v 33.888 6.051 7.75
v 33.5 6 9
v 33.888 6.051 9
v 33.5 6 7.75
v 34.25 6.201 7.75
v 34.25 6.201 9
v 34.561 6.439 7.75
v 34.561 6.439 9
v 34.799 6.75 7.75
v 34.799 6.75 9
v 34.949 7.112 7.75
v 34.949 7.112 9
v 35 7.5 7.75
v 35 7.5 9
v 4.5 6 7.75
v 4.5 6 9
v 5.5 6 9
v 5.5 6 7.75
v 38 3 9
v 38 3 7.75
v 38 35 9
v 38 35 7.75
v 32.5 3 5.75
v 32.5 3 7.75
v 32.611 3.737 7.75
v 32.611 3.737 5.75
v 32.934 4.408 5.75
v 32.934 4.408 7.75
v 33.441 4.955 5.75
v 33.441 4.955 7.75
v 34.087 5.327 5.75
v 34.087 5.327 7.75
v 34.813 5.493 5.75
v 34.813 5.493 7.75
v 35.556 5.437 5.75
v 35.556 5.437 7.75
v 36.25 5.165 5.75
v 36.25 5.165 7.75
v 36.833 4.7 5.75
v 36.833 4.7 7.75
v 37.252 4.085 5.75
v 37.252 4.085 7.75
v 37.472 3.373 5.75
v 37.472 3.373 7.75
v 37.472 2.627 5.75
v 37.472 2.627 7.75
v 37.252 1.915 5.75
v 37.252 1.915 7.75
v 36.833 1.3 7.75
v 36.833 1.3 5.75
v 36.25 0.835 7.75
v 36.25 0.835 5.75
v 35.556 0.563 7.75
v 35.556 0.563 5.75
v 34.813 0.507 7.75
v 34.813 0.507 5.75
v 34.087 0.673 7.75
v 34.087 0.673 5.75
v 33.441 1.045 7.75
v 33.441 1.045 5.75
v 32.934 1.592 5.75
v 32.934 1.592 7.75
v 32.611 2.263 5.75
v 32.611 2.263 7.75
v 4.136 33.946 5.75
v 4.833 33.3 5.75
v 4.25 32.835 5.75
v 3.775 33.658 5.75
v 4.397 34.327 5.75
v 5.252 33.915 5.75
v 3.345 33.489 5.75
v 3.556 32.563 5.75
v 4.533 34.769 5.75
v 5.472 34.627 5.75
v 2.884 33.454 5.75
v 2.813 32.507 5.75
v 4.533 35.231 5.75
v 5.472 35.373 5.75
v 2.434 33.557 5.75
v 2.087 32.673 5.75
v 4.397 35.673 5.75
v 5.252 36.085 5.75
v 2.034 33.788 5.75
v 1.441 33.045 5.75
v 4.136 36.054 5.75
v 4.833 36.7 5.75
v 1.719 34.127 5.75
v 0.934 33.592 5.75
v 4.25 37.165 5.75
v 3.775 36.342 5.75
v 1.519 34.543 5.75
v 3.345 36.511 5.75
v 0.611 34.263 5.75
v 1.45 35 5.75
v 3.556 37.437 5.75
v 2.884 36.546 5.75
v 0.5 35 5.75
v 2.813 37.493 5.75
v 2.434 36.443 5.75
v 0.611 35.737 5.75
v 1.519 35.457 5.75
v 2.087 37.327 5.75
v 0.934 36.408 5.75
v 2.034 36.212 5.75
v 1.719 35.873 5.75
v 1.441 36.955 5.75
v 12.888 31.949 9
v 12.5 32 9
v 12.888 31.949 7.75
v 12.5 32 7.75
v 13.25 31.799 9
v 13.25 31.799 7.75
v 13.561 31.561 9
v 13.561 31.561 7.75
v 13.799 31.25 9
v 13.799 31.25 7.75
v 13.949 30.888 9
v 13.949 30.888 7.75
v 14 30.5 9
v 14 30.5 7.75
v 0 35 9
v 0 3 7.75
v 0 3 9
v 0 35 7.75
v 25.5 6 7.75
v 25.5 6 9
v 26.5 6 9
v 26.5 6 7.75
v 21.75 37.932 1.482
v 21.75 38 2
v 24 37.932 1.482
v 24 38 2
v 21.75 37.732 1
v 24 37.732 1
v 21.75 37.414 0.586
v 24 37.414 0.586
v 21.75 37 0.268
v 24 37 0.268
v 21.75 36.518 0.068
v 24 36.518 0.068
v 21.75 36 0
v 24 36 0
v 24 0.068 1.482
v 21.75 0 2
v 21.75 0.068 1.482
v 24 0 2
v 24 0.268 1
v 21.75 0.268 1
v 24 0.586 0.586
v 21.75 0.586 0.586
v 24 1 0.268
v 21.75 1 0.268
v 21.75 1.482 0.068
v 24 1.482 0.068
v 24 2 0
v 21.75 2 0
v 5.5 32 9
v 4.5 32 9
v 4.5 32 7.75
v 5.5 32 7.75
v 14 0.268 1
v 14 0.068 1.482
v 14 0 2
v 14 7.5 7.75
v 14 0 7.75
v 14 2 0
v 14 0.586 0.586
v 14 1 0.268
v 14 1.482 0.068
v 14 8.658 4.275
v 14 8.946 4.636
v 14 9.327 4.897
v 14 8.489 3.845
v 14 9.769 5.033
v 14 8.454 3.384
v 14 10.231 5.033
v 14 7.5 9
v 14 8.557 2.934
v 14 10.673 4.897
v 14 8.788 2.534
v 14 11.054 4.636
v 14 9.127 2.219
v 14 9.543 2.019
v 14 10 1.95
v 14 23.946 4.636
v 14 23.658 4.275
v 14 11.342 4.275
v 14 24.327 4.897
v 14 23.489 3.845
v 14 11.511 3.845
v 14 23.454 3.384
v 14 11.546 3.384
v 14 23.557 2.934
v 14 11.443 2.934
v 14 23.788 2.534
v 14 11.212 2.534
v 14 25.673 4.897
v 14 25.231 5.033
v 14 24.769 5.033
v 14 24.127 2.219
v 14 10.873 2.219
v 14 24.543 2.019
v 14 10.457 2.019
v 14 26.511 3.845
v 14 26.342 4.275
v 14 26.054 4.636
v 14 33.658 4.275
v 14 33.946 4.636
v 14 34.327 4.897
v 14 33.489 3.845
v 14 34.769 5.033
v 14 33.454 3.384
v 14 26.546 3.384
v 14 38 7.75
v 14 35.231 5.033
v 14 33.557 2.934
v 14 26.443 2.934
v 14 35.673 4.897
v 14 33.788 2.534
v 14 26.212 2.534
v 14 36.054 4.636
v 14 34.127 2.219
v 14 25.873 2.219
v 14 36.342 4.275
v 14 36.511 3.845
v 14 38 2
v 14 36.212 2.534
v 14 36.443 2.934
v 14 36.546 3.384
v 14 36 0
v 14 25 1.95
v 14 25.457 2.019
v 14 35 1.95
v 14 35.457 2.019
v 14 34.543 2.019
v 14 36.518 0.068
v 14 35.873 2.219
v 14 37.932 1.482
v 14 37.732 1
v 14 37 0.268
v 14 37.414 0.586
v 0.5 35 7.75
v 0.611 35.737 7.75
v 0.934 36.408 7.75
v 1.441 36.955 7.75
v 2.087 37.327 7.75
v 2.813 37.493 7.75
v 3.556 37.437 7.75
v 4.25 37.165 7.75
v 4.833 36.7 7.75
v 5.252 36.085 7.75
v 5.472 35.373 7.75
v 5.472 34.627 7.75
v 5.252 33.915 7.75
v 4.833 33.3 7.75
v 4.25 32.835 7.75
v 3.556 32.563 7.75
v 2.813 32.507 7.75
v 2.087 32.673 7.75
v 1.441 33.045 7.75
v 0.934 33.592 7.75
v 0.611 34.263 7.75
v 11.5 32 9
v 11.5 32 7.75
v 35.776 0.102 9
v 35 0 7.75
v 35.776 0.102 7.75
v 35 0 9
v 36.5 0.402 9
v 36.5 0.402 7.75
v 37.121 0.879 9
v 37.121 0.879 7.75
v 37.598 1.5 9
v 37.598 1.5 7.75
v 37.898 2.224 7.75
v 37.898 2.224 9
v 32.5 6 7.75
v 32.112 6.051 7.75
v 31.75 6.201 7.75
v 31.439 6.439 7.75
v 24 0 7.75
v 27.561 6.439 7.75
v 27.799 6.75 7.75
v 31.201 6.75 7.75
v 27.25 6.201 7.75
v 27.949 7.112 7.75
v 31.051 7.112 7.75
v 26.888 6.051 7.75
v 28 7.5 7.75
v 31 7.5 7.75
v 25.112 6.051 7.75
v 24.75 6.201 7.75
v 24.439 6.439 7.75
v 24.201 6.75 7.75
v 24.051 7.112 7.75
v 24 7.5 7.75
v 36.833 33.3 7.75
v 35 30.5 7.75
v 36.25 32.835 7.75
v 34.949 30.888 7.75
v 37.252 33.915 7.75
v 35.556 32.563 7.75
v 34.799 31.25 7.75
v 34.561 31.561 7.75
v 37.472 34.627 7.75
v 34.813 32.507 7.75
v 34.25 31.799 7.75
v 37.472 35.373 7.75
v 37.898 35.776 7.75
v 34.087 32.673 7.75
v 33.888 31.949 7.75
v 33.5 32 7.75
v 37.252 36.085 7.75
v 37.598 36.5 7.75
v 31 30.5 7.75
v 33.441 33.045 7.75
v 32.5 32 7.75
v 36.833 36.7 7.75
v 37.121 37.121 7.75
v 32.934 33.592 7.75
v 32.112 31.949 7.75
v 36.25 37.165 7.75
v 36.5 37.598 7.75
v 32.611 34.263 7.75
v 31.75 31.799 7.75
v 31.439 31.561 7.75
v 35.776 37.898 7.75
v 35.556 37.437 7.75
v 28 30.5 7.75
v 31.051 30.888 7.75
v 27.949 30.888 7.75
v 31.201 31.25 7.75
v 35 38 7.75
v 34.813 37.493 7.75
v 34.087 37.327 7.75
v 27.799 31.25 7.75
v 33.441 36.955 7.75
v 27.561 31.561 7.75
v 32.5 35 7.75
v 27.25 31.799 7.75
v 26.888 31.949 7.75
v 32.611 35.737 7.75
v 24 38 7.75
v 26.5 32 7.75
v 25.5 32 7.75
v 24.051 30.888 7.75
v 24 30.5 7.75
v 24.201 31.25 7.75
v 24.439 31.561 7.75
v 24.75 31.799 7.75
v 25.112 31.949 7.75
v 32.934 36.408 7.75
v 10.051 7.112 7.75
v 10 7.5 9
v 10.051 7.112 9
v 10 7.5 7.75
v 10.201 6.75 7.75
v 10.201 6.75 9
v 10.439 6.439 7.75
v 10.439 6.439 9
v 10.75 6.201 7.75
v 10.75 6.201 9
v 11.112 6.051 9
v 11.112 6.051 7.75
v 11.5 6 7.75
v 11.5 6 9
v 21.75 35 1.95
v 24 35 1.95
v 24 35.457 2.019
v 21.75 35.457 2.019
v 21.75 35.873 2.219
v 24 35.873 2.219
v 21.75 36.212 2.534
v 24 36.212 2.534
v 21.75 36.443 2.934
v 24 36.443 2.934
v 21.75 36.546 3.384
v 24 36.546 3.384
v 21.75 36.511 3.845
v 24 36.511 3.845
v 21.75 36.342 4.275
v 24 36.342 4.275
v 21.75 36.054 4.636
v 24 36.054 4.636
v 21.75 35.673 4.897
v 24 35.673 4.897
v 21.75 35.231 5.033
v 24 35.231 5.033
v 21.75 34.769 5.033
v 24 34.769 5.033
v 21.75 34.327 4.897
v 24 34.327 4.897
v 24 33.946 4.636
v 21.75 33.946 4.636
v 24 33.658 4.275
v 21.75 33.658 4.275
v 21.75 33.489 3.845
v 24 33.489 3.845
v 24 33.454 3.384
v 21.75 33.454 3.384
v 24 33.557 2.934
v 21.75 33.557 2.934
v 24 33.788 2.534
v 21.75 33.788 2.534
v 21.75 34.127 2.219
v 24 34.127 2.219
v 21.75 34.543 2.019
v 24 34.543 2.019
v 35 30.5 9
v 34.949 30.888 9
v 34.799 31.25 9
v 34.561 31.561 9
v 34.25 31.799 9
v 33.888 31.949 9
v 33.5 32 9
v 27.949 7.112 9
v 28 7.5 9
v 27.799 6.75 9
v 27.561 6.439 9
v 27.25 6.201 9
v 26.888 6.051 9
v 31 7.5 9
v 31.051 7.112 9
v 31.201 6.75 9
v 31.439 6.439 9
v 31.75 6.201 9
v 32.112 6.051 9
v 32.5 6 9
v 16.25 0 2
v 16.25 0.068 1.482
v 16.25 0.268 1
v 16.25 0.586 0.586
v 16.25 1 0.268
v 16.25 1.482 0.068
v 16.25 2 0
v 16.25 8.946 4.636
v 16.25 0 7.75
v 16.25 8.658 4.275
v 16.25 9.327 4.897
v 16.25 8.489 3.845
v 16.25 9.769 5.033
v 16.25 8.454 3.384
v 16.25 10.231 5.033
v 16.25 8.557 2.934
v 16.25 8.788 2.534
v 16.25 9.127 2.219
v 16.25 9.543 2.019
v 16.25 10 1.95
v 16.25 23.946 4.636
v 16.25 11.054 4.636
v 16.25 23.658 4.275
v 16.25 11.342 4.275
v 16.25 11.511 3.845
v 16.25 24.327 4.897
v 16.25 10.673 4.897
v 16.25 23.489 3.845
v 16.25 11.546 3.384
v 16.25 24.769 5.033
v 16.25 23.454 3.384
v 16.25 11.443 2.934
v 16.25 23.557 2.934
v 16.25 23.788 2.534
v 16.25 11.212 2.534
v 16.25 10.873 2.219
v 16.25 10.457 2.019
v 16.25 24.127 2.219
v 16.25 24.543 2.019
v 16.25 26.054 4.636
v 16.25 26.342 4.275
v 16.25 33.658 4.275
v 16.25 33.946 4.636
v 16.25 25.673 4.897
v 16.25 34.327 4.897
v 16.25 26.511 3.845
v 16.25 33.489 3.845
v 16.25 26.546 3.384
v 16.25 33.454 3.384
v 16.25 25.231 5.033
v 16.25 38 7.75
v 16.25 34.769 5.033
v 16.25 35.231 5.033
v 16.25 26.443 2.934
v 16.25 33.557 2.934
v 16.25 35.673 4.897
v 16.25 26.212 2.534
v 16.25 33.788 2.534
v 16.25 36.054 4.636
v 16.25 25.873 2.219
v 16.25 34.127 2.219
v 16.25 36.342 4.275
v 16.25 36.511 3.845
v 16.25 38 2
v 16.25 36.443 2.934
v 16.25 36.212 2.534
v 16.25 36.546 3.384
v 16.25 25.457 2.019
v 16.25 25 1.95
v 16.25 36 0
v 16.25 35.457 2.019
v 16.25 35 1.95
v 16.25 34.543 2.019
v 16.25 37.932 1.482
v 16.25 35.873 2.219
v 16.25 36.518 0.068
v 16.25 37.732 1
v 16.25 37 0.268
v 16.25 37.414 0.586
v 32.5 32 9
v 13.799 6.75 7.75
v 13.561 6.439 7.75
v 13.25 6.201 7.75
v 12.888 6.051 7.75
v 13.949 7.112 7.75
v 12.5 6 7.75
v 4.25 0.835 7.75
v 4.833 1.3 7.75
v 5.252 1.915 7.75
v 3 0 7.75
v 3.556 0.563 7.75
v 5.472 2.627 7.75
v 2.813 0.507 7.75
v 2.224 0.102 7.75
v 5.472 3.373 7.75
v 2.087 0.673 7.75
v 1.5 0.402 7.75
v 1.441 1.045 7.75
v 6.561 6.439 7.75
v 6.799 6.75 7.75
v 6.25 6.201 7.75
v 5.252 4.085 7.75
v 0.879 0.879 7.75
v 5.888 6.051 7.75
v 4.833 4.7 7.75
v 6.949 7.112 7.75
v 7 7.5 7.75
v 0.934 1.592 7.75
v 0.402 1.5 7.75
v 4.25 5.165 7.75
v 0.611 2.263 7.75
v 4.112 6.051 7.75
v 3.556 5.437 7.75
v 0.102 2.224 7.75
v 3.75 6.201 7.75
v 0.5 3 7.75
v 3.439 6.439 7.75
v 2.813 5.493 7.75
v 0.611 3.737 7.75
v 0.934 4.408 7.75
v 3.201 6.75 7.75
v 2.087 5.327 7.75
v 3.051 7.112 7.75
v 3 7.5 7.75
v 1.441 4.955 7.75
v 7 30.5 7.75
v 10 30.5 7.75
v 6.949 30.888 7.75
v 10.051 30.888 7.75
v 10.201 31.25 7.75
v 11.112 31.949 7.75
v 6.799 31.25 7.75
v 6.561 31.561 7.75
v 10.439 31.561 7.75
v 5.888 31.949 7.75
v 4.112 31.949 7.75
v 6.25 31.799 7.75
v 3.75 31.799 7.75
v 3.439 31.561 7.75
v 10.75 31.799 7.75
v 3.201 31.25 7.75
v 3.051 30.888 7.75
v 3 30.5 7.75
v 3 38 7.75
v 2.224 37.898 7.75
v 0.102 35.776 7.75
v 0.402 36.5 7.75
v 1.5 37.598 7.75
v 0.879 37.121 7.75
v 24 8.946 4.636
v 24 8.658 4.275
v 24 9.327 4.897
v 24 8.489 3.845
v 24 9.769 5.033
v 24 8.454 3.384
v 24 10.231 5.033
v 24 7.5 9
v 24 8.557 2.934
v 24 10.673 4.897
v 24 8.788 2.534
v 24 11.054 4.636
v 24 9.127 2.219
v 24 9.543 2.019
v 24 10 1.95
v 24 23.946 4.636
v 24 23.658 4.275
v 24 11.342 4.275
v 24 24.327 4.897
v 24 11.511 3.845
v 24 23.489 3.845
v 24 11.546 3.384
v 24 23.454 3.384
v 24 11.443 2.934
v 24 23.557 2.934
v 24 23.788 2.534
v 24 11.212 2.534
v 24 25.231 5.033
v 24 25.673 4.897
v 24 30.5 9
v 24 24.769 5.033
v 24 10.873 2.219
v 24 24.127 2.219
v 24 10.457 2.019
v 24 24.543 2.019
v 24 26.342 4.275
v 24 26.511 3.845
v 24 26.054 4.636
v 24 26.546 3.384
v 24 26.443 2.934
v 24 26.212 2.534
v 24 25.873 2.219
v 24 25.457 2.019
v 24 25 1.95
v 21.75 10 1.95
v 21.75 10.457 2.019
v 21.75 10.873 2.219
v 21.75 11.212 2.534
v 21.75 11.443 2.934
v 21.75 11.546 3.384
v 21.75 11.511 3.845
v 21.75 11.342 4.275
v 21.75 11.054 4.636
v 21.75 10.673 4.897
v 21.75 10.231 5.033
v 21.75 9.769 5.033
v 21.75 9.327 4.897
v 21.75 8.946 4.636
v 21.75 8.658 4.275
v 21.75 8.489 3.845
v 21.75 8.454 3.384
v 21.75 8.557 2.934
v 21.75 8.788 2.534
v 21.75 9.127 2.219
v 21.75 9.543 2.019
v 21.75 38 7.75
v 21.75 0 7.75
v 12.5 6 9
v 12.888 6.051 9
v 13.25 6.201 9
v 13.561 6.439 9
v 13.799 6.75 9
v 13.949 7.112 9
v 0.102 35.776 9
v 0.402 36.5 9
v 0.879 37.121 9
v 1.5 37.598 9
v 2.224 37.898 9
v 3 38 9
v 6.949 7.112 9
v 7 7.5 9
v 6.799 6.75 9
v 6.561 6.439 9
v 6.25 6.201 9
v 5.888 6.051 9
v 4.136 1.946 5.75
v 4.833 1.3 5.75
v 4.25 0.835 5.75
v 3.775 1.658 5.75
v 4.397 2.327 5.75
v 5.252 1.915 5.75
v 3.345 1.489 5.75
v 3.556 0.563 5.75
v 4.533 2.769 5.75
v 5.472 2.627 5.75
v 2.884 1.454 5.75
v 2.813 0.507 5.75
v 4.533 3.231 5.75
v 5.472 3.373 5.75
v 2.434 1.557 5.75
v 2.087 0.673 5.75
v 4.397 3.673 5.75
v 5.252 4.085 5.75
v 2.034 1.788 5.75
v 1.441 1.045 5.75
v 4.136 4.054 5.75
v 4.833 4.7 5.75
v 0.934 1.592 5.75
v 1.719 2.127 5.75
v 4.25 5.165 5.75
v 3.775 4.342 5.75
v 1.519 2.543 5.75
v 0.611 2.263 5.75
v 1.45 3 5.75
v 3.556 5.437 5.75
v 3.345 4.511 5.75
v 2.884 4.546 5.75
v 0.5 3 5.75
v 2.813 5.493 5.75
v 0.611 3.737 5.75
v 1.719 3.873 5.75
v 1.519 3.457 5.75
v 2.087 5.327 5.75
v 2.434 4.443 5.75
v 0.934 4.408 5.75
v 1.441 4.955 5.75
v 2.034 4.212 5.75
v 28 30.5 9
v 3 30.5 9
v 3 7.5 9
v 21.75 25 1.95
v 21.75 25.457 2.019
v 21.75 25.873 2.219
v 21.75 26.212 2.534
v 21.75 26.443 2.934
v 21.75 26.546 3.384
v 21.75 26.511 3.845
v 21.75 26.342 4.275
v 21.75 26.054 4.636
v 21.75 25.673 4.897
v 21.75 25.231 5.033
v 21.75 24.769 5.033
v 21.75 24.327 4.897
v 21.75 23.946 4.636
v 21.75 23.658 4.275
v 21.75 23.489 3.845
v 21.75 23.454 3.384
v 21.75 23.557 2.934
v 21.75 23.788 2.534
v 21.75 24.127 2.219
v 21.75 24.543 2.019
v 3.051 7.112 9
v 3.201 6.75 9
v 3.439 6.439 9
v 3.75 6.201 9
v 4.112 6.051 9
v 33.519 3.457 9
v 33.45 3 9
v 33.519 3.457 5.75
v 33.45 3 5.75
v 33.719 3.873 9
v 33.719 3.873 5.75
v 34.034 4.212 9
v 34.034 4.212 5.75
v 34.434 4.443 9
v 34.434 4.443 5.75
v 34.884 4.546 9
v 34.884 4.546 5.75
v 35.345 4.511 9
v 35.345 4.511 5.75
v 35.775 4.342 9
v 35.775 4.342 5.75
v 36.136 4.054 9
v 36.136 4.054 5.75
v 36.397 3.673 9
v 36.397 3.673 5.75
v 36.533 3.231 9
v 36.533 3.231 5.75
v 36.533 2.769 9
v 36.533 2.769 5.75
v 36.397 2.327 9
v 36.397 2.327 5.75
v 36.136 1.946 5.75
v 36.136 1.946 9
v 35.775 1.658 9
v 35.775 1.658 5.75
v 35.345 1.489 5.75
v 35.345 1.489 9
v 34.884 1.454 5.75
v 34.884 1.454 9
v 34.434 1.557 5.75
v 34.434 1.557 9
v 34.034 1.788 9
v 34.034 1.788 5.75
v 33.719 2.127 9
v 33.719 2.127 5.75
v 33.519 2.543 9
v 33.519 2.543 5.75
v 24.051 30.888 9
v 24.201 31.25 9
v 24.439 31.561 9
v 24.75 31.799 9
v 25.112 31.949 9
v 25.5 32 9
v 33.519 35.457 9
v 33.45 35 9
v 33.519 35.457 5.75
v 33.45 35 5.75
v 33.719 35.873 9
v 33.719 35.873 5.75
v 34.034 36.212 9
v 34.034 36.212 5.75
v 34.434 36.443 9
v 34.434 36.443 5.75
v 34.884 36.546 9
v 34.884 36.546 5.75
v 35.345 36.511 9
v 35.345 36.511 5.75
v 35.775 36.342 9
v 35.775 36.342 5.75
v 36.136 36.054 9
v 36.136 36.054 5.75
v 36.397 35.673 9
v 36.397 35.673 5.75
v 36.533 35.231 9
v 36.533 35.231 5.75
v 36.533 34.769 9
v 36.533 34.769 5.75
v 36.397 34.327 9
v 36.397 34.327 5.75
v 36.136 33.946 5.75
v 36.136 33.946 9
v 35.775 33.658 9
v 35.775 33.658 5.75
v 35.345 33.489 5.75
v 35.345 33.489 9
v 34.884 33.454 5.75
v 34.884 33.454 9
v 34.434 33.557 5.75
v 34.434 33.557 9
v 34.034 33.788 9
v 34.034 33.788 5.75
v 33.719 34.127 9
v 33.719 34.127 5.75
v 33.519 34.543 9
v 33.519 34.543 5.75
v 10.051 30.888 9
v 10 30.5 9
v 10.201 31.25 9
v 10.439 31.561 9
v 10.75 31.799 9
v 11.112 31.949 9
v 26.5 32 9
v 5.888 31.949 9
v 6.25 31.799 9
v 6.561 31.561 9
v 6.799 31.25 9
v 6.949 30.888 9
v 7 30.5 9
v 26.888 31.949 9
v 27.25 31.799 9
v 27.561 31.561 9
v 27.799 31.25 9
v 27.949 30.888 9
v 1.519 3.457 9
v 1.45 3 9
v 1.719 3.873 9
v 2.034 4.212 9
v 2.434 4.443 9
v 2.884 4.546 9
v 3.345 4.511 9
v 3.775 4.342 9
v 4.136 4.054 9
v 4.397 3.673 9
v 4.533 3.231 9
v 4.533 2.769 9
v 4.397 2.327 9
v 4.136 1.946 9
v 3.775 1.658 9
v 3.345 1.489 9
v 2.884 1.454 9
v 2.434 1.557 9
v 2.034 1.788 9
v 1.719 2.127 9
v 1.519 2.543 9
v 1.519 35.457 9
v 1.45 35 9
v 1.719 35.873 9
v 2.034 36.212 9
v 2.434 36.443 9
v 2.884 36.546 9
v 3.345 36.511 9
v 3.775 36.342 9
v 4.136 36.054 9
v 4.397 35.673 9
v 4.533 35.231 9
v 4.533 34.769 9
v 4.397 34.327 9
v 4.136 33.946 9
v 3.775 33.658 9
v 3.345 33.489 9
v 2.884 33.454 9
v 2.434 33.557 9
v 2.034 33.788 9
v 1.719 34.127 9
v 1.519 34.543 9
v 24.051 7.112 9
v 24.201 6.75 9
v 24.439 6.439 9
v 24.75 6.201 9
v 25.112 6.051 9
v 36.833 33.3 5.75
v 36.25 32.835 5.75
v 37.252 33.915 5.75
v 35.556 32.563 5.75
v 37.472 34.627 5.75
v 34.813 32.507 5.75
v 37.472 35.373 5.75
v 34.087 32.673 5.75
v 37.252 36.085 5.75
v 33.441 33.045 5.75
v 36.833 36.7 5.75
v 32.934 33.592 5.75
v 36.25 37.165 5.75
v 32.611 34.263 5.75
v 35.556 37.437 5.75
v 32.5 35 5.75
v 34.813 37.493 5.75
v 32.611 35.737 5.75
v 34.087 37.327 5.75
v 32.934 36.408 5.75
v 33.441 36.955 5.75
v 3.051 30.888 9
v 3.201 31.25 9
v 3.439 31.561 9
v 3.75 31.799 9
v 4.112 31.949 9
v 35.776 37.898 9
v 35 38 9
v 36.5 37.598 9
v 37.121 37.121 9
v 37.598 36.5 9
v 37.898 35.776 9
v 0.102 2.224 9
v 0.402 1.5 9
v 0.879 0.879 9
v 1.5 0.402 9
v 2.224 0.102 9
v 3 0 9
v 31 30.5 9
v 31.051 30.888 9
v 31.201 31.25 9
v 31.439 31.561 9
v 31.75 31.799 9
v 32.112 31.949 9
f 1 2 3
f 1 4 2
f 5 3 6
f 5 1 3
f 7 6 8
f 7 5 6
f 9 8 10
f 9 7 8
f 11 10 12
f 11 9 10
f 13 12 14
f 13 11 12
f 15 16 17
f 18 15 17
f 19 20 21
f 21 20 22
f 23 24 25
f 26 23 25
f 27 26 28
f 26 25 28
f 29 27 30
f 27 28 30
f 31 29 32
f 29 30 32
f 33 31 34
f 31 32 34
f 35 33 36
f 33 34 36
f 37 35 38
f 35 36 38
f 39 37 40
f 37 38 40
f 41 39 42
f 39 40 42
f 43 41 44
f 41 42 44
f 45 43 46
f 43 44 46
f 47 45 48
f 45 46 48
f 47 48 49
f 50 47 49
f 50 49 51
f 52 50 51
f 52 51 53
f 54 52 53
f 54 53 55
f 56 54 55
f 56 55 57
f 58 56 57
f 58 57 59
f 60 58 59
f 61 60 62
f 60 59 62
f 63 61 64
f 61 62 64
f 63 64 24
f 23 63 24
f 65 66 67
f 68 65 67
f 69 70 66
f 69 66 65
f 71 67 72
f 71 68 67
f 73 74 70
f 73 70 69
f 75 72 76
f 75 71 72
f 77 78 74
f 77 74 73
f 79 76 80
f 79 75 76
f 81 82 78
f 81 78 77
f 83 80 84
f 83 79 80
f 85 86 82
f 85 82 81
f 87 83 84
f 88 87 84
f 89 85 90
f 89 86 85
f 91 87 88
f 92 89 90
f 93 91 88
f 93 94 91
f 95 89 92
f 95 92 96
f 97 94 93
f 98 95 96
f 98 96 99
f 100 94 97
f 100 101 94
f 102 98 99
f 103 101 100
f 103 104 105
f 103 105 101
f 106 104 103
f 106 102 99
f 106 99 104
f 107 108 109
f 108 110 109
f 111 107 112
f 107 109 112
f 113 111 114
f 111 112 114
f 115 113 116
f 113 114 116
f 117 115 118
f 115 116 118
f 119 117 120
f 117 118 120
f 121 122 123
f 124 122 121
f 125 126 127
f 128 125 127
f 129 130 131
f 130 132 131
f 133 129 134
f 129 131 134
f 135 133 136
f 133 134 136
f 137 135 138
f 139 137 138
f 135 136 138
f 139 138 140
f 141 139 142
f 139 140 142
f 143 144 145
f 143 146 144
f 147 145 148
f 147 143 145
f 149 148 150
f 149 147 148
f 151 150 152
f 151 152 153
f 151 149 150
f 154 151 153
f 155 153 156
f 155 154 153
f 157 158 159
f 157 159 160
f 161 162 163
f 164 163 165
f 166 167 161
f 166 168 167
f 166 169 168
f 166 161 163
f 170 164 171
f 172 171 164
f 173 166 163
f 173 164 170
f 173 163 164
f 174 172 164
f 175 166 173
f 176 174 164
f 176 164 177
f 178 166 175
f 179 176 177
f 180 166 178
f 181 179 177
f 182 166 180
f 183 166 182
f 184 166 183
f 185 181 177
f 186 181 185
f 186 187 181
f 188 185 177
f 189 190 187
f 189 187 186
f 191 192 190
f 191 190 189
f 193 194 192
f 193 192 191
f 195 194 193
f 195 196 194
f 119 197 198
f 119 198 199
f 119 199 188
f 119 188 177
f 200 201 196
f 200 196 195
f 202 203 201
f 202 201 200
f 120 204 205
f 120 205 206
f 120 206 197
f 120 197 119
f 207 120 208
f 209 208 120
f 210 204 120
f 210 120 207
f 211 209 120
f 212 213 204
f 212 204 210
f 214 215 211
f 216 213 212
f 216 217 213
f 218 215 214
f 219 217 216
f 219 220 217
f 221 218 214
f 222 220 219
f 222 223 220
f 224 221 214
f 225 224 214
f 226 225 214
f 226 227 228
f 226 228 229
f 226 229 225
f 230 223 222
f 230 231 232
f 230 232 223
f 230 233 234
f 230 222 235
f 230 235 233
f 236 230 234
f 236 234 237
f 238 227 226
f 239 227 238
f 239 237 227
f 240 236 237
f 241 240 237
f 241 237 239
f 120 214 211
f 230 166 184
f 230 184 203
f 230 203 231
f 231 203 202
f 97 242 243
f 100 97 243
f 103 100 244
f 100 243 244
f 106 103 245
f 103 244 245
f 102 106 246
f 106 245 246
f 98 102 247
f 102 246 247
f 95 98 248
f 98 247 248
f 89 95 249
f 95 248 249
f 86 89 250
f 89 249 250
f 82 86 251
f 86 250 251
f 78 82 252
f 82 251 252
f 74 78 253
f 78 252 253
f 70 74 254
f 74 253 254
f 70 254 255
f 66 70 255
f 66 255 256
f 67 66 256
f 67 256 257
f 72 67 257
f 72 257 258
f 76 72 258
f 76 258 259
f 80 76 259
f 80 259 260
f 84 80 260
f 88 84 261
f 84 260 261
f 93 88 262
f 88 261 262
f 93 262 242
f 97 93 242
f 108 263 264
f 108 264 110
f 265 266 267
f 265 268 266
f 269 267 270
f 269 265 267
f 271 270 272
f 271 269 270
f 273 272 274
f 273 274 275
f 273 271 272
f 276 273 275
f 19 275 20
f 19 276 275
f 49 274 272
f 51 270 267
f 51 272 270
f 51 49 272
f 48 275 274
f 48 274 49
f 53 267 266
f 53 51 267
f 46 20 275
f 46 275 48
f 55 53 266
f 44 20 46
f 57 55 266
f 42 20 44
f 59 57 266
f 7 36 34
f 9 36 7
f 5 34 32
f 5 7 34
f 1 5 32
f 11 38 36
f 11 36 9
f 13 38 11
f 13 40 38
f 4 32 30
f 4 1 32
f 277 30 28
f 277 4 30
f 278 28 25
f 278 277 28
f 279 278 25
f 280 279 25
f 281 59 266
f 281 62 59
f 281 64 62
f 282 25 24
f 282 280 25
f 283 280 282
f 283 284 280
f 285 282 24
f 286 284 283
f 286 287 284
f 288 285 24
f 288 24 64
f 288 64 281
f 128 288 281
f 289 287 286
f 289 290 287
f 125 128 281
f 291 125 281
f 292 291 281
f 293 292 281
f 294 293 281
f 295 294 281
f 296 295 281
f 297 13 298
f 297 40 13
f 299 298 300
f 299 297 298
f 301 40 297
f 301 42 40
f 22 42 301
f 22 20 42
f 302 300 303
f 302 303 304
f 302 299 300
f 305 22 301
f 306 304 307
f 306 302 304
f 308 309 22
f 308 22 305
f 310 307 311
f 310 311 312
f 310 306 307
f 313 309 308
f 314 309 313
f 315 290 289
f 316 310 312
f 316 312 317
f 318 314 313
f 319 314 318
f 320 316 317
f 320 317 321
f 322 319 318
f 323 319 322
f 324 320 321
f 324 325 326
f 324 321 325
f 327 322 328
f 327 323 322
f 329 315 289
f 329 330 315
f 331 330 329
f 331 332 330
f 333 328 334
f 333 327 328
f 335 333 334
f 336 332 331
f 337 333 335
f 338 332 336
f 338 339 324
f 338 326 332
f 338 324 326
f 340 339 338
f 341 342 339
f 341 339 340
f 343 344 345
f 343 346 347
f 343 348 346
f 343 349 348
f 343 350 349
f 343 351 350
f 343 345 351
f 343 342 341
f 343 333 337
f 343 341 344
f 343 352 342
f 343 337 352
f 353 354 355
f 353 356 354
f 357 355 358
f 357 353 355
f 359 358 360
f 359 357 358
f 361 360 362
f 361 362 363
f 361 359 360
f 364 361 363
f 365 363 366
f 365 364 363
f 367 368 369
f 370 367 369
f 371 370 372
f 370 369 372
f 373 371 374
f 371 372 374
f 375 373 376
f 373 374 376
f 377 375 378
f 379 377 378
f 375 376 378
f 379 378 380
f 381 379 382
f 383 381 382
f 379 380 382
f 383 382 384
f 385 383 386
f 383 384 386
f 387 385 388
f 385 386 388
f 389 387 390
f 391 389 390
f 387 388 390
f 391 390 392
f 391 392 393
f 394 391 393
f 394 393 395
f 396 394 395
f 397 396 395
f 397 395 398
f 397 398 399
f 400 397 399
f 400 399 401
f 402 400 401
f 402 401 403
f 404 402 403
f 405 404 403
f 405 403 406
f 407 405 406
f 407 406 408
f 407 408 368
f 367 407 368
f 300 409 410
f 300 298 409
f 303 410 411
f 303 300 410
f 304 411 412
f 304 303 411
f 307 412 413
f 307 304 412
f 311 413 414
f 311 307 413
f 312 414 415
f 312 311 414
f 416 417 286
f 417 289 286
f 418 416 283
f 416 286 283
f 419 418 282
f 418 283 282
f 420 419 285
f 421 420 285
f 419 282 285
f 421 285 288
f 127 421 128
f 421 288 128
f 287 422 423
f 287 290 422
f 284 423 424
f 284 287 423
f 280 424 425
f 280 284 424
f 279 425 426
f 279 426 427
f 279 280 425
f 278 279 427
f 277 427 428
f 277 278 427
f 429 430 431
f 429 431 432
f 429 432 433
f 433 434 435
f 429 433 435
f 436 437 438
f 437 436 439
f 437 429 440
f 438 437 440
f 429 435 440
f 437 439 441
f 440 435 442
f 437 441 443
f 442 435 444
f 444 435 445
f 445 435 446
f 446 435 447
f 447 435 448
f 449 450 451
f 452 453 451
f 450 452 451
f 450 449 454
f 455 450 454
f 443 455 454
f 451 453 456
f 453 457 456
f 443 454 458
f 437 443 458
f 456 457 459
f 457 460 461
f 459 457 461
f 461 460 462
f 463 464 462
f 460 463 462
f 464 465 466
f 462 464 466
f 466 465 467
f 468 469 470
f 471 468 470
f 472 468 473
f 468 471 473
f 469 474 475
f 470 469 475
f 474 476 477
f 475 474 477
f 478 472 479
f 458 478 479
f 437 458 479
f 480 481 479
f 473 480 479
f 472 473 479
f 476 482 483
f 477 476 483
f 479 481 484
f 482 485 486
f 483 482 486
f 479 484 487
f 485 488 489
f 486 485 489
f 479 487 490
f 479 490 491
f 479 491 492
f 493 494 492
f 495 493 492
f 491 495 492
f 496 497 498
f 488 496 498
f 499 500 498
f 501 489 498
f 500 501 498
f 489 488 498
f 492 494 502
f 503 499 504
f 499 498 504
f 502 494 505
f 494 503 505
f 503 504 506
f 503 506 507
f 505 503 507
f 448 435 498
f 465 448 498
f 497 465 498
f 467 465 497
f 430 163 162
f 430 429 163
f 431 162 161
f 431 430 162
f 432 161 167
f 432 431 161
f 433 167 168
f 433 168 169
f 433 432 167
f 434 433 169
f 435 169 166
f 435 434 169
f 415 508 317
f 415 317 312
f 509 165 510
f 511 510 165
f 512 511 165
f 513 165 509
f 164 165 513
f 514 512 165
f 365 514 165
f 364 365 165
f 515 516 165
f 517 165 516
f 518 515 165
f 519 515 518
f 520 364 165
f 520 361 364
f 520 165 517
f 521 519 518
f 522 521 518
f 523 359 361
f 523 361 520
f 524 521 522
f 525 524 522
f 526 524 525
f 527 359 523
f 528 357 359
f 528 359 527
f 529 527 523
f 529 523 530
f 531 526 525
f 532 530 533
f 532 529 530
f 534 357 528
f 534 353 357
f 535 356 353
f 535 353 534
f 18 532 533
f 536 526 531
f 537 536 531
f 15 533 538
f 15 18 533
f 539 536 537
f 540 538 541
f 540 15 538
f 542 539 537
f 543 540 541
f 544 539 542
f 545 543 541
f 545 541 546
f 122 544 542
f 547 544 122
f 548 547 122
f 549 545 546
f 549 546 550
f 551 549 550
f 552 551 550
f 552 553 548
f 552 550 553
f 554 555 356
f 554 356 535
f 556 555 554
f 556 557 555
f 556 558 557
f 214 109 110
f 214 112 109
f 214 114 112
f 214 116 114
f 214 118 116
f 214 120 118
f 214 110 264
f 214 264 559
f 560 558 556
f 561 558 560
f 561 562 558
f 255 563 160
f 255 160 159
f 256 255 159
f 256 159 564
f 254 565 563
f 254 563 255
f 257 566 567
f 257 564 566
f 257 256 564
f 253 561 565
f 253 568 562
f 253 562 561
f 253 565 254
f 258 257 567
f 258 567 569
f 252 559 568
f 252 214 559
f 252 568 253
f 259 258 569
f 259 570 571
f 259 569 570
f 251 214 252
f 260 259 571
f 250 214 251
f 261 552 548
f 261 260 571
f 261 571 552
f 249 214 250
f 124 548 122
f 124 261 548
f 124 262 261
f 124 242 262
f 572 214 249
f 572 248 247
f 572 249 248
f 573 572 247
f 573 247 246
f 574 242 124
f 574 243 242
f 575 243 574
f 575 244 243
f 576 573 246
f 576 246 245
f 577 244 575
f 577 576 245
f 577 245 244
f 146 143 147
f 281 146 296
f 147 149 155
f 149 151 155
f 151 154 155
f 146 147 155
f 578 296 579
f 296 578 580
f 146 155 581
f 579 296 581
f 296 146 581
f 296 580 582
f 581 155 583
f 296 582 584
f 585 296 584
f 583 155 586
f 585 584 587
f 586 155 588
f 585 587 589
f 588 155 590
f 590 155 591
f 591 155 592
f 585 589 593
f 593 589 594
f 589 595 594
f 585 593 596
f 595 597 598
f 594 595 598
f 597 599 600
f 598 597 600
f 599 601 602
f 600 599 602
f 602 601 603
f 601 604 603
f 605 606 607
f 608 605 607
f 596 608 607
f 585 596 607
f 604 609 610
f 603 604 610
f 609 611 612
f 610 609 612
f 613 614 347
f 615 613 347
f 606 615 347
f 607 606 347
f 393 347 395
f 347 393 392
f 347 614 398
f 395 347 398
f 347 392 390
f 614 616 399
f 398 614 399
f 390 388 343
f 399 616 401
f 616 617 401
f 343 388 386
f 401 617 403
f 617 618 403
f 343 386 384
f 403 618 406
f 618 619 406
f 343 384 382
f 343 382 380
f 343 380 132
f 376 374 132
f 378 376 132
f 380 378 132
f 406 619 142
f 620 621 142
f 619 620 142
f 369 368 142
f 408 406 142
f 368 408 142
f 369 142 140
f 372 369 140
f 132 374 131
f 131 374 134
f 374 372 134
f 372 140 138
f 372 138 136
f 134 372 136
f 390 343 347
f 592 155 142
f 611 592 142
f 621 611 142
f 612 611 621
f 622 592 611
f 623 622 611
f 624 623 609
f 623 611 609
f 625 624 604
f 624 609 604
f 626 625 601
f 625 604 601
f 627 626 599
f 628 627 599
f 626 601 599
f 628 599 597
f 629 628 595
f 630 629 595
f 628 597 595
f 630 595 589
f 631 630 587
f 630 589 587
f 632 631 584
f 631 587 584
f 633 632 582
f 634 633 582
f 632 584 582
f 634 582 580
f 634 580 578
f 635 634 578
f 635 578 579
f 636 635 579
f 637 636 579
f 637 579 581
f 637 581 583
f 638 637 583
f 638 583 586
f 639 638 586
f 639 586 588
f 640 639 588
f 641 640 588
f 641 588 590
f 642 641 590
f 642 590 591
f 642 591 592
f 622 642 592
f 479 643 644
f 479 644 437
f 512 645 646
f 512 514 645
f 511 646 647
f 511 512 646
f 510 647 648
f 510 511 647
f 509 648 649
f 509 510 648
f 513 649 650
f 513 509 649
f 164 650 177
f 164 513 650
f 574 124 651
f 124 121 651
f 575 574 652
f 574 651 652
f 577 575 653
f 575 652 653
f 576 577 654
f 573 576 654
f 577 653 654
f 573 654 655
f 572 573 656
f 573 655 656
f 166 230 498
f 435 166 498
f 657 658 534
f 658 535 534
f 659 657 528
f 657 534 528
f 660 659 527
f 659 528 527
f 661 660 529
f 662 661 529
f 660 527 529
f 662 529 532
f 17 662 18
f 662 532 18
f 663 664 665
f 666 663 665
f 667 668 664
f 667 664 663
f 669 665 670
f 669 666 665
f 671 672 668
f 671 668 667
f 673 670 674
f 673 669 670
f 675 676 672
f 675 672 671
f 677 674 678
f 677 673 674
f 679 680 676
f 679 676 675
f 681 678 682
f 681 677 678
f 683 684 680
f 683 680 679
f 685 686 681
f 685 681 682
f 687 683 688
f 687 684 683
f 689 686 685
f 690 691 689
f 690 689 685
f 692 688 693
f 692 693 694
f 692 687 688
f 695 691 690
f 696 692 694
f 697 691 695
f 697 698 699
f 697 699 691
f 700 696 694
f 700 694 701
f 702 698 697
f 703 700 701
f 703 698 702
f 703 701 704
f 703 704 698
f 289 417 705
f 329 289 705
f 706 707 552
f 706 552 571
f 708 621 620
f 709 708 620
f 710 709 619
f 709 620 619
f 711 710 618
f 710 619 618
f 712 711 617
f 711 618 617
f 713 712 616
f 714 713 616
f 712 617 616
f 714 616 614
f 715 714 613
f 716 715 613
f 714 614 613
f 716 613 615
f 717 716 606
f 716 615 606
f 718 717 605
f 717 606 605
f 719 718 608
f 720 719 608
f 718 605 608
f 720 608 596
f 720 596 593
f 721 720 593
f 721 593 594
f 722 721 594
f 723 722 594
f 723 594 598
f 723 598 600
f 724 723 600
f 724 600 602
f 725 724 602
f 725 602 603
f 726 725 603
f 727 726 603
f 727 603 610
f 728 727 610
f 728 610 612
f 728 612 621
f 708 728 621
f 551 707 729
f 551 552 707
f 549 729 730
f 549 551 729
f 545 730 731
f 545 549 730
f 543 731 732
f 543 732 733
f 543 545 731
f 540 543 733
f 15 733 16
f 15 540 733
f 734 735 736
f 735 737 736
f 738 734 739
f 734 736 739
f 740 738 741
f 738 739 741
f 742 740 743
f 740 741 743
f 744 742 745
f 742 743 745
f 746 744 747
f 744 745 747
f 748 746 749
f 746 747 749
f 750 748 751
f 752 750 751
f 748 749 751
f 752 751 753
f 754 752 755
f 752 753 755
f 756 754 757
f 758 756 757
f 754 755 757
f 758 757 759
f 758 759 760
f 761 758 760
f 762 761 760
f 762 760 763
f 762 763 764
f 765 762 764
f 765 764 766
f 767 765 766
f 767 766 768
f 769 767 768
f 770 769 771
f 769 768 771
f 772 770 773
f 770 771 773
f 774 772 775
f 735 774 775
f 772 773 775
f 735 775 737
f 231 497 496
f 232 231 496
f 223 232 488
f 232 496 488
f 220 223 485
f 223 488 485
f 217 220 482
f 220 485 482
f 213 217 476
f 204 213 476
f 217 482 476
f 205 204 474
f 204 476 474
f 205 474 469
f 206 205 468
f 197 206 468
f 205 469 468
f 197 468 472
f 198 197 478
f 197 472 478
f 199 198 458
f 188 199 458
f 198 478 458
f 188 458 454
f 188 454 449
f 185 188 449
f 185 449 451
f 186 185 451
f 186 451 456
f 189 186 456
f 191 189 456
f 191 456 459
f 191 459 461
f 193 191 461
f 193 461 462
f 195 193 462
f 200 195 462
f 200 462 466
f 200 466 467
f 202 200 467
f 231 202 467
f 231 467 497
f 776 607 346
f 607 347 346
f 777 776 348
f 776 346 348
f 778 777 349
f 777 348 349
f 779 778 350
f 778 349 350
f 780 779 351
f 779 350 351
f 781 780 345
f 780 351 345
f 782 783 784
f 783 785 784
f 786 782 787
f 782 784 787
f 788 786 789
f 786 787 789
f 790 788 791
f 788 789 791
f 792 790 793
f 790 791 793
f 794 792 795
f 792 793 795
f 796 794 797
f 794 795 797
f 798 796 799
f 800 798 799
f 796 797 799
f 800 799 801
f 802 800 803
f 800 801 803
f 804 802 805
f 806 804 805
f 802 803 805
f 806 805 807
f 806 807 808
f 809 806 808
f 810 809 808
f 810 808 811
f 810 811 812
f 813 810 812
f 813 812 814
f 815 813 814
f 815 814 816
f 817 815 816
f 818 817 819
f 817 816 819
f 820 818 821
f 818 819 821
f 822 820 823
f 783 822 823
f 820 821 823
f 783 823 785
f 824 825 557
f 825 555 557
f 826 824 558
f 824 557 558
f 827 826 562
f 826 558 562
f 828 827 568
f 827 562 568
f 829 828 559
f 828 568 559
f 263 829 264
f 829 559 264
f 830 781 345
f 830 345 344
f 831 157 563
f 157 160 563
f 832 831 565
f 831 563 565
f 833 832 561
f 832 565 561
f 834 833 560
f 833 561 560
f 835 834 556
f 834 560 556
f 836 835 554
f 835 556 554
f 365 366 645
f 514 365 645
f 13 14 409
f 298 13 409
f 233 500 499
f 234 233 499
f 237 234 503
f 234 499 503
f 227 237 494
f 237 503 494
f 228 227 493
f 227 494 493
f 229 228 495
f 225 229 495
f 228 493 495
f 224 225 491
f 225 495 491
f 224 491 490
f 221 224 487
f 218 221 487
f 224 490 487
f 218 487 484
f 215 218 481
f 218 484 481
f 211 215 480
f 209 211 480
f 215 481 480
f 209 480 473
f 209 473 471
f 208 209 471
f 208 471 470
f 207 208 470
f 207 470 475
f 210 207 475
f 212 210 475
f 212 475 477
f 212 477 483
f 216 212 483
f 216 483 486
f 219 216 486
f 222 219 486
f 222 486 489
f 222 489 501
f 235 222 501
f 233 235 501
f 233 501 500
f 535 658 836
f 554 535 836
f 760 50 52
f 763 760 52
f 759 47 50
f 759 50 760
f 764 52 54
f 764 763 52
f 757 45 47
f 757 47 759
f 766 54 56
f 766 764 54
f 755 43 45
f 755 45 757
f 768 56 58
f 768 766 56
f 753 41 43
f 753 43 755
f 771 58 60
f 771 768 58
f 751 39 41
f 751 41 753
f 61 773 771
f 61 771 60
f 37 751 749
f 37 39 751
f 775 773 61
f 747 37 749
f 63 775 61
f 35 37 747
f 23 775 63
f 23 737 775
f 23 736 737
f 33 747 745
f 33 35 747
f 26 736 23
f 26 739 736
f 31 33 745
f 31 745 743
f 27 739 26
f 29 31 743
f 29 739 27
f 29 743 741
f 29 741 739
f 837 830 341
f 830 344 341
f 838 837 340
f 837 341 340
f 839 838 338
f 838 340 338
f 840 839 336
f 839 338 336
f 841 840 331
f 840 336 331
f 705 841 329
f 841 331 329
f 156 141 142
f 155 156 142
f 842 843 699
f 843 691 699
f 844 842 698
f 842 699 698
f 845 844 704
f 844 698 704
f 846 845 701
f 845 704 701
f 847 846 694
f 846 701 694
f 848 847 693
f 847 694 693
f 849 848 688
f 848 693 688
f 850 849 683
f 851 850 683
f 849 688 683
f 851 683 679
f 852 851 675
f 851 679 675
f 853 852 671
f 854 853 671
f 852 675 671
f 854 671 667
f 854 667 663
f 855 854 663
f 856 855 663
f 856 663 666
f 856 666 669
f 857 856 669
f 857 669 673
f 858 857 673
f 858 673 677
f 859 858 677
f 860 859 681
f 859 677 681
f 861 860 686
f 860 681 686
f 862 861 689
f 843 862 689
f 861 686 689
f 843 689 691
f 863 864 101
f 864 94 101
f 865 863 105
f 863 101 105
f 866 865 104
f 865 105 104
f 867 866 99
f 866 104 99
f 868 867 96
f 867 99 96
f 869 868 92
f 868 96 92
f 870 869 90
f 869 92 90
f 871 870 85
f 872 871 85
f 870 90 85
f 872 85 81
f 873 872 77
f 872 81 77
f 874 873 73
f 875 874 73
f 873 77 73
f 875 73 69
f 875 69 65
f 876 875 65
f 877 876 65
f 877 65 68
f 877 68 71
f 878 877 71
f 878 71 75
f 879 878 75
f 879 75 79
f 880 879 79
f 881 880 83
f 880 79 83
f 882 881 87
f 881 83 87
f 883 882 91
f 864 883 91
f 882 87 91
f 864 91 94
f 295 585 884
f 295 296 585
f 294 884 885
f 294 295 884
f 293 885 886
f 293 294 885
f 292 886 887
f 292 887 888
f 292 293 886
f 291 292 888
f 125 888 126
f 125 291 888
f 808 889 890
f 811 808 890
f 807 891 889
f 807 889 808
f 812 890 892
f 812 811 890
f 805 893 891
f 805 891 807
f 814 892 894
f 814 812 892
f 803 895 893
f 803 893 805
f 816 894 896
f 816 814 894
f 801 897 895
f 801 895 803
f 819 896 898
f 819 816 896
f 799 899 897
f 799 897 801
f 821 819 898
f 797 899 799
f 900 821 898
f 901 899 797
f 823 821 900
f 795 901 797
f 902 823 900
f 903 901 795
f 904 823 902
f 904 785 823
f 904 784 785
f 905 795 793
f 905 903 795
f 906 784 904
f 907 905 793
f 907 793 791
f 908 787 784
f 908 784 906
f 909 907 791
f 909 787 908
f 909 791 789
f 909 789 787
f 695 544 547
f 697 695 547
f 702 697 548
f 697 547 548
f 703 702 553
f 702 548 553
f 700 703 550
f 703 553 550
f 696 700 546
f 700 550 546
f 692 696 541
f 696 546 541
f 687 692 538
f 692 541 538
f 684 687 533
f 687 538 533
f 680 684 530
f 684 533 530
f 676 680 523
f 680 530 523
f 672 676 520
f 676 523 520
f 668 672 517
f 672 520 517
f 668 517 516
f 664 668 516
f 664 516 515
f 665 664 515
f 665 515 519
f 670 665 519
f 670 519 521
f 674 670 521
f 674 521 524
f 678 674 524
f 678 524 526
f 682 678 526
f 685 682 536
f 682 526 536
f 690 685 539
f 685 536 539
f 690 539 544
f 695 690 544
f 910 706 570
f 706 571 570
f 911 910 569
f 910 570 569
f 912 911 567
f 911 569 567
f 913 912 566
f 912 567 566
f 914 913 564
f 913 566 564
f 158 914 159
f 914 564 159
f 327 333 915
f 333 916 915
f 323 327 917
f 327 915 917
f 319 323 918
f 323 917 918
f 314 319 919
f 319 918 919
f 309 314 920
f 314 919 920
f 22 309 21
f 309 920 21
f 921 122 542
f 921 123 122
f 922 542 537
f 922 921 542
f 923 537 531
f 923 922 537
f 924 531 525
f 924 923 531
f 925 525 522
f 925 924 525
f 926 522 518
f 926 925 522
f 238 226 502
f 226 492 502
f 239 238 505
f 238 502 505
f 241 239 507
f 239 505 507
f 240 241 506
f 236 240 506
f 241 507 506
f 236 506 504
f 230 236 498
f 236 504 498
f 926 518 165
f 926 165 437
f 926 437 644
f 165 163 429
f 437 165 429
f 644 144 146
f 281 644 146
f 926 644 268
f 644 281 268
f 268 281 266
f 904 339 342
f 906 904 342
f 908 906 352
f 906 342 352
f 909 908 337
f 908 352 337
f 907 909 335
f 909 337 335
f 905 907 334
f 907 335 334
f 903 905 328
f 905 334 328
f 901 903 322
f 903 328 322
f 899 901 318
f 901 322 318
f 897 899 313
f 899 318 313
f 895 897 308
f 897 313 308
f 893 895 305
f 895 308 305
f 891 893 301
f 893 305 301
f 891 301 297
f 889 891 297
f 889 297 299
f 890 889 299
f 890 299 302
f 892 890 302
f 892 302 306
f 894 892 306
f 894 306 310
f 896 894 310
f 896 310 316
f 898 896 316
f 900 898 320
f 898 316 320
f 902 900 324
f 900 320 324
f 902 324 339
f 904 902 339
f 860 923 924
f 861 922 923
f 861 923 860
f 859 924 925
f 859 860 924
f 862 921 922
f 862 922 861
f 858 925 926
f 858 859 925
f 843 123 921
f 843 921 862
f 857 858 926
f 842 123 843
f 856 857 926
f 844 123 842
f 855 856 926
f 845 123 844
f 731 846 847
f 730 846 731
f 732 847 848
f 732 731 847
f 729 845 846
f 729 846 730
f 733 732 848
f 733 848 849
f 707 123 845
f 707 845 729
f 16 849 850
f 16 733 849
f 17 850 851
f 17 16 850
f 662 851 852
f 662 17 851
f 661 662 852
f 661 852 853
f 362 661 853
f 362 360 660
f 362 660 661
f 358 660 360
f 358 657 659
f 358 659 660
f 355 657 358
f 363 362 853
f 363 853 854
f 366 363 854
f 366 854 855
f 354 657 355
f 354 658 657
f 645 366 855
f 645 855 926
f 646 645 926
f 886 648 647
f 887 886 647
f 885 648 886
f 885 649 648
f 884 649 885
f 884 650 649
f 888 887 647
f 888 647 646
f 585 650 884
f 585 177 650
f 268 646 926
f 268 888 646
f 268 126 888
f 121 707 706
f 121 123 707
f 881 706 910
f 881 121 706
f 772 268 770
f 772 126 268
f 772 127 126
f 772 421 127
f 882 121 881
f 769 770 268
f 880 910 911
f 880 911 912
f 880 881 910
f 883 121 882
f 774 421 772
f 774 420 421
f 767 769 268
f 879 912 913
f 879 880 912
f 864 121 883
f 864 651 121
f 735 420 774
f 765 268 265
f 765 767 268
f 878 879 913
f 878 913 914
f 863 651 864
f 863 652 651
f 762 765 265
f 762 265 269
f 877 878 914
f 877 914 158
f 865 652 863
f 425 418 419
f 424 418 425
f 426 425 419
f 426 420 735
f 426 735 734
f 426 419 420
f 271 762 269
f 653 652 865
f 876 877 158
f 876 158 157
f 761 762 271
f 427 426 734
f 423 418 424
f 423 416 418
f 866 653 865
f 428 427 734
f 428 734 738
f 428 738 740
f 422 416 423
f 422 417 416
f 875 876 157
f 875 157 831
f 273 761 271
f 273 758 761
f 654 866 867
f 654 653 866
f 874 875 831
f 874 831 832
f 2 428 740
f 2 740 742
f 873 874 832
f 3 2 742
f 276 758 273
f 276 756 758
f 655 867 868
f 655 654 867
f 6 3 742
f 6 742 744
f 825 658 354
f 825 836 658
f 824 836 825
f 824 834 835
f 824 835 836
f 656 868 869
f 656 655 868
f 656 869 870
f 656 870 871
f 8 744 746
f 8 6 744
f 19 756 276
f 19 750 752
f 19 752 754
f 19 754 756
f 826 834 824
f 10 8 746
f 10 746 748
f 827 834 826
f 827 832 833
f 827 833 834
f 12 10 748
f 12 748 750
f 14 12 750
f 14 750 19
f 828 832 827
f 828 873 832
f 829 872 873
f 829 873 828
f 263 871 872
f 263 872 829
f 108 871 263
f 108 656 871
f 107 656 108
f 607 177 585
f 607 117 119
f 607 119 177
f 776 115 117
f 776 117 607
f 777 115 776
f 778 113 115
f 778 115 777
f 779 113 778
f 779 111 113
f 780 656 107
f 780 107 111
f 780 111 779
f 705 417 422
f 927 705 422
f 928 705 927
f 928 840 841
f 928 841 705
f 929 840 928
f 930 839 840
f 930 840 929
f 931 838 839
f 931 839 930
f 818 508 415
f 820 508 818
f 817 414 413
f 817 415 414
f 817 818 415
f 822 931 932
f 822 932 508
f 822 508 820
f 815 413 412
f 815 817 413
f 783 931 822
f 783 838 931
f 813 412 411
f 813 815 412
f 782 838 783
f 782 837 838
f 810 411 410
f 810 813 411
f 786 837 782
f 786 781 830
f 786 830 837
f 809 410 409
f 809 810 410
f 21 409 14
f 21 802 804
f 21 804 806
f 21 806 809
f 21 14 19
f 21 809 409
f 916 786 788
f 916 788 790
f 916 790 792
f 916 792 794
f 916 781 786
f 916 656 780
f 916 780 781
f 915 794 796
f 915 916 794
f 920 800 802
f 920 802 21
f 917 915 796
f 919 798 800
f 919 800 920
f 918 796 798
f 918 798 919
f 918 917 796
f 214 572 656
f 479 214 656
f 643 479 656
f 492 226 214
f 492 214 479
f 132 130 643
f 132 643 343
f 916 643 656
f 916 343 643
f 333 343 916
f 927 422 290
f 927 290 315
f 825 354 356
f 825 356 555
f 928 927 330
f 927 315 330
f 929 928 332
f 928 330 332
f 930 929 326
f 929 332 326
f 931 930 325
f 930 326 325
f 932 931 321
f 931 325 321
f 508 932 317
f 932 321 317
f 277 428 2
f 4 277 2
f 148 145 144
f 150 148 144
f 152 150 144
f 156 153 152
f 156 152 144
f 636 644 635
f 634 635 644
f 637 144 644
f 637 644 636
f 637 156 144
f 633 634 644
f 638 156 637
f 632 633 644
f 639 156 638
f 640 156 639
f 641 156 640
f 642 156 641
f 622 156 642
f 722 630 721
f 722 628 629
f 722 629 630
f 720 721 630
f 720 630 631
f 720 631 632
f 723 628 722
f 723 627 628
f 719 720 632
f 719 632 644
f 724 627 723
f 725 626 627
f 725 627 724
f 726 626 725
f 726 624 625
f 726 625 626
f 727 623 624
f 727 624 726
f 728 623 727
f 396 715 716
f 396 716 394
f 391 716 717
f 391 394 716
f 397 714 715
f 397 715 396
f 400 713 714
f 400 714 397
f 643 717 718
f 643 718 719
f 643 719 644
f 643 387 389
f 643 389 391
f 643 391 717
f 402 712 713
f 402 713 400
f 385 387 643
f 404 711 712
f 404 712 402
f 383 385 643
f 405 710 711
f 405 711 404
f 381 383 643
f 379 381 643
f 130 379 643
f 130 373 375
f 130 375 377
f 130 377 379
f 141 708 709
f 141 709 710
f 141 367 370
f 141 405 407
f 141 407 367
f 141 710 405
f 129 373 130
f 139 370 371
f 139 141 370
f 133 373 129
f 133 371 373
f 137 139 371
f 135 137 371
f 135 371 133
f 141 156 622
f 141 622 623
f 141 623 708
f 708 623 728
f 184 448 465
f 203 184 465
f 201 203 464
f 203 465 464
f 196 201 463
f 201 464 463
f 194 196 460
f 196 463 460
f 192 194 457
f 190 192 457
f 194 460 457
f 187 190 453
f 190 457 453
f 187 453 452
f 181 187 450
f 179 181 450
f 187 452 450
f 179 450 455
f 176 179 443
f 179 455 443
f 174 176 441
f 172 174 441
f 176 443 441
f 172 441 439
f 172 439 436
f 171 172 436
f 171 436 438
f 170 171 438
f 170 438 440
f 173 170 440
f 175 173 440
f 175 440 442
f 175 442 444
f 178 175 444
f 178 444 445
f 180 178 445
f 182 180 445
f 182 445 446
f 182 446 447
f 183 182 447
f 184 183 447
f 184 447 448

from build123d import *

# Parameters (mm, degrees)
ESQUISSE1_W                  = 38
ESQUISSE1_H                  = 38
BOSS_EXTRU_1_DEPTH           = 9
ESQUISSE2_W                  = 14
ESQUISSE2_H                  = 38
ESQUISSE2_W_2                = 5.5
ENL_V_MAT_EXTRU_1_DEPTH      = 7.75
ESQUISSE3_R                  = 1.55
ENL_V_MAT_EXTRU_2_DEPTH      = 25
CONG_1_R                     = 3
CONG_2_R                     = 2
ESQUISSE9_R                  = 2.5
BOSS_EXTRU_2_DEPTH           = 2
ESQUISSE5_R                  = 1.55
ENL_V_MAT_EXTRU_4_DEPTH      = 8.75
ENL_V_MAT_EXTRU_4_DEPTH_BACK = 2.25
ESQUISSE10_W                 = 4
ESQUISSE10_H                 = 26
ENL_V_MAT_EXTRU_5_DEPTH      = 10
CONG_3_R                     = 1.5


with BuildPart() as part:
    # Esquisse1 → Boss.-Extru.1 (new body)
    with BuildSketch(Plane.XY):
        with Locations((19, 19)):
            Rectangle(ESQUISSE1_W, ESQUISSE1_H)
    extrude(amount=BOSS_EXTRU_1_DEPTH)

    # Esquisse2 → Enlèv. mat.-Extru.1 (cut)
    with BuildSketch(Plane(origin=(0, 0, 0), x_dir=(-1, 0, 0), z_dir=(0, 0, -1))):
        with Locations((-7, 19)):
            Rectangle(ESQUISSE2_W, ESQUISSE2_H)
        with Locations((-31, 19)):
            Rectangle(ESQUISSE2_W, ESQUISSE2_H)
        with Locations((-19, 19)):
            Rectangle(ESQUISSE2_W_2, ESQUISSE2_H)
    extrude(amount=-ENL_V_MAT_EXTRU_1_DEPTH, mode=Mode.SUBTRACT)

    # Esquisse3 → Enlèv. mat.-Extru.2 (cut, through all)
    with BuildSketch(Plane(origin=(24, 0, 0), x_dir=(0, 0, -1), z_dir=(1, 0, 0))):
        with Locations((-3.5, 10)):
            Circle(ESQUISSE3_R)
        with Locations((-3.5, 35)):
            Circle(ESQUISSE3_R)
        with Locations((-3.5, 25)):
            Circle(ESQUISSE3_R)
    extrude(amount=-ENL_V_MAT_EXTRU_2_DEPTH, mode=Mode.SUBTRACT)

    # Congé1
    cong_1_edges = [part.edges().sort_by_distance(p)[0] for p in [
        (0, 38, 8.375),
        (38, 38, 8.375),
        (38, 0, 8.375),
        (0, 0, 8.375),
    ]]
    fillet(cong_1_edges, radius=CONG_1_R)

    # Congé2
    cong_2_edges = [part.edges().sort_by_distance(p)[0] for p in [
        (22.875, 38, 0),
        (15.125, 38, 0),
        (15.125, 0, 0),
        (22.875, 0, 0),
    ]]
    fillet(cong_2_edges, radius=CONG_2_R)

    # Esquisse9 → Boss.-Extru.2 (add)
    with BuildSketch(Plane(origin=(0, 0, 7.75), x_dir=(-1, 0, 0), z_dir=(0, 0, -1))):
        with Locations((-35, 35)):
            Circle(ESQUISSE9_R)
        with Locations((-3, 35)):
            Circle(ESQUISSE9_R)
        with Locations((-3, 3)):
            Circle(ESQUISSE9_R)
        with Locations((-35, 3)):
            Circle(ESQUISSE9_R)
    extrude(amount=BOSS_EXTRU_2_DEPTH)

    # Esquisse5 → Enlèv. mat.-Extru.4 (cut, two sides)
    with BuildSketch(Plane(origin=(0, 0, 7.75), x_dir=(-1, 0, 0), z_dir=(0, 0, -1))) as enl_v_mat_extru_4_sk:
        with Locations((-35, 35)):
            Circle(ESQUISSE5_R)
        with Locations((-35, 3)):
            Circle(ESQUISSE5_R)
        with Locations((-3, 3)):
            Circle(ESQUISSE5_R)
        with Locations((-3, 35)):
            Circle(ESQUISSE5_R)
    extrude(amount=ENL_V_MAT_EXTRU_4_DEPTH, mode=Mode.SUBTRACT)
    extrude(enl_v_mat_extru_4_sk.sketch, amount=-ENL_V_MAT_EXTRU_4_DEPTH_BACK, mode=Mode.SUBTRACT)

    # Esquisse10 → Enlèv. mat.-Extru.5 (cut, through all)
    with BuildSketch(Plane.XY.offset(9)):
        with Locations((12, 19)):
            Rectangle(ESQUISSE10_W, ESQUISSE10_H)
        with Locations((5, 19)):
            Rectangle(ESQUISSE10_W, ESQUISSE10_H)
        with Locations((26, 19)):
            Rectangle(ESQUISSE10_W, ESQUISSE10_H)
        with Locations((33, 19)):
            Rectangle(ESQUISSE10_W, ESQUISSE10_H)
    extrude(amount=-ENL_V_MAT_EXTRU_5_DEPTH, mode=Mode.SUBTRACT)

    # Congé3
    cong_3_edges = [part.edges().sort_by_distance(p)[0] for p in [
        (3, 6, 8.375),
        (3, 32, 8.375),
        (7, 32, 8.375),
        (7, 6, 8.375),
        (24, 6, 8.375),
        (24, 32, 8.375),
        (28, 32, 8.375),
        (28, 6, 8.375),
        (35, 32, 8.375),
        (35, 6, 8.375),
        (31, 6, 8.375),
        (31, 32, 8.375),
        (14, 32, 8.375),
        (10, 6, 8.375),
        (10, 32, 8.375),
        (14, 6, 8.375),
    ]]
    fillet(cong_3_edges, radius=CONG_3_R)


solid = part.part
